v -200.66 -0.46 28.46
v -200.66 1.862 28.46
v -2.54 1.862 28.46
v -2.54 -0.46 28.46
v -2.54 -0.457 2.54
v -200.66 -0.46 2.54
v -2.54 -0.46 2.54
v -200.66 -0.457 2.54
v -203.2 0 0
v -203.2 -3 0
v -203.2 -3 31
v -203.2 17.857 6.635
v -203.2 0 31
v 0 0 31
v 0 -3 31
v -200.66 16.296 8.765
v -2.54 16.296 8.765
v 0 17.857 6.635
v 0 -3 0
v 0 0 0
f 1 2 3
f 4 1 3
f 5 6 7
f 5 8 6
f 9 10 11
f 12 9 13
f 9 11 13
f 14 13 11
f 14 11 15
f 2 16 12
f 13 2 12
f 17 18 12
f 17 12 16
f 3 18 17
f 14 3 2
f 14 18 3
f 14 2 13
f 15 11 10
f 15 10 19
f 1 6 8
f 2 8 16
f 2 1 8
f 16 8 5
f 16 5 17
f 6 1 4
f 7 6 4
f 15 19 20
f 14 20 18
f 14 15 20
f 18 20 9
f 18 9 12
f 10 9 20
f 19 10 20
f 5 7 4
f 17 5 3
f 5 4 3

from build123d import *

# Parameters (mm, degrees)
F0_W     = 203.2
F0_H     = 31
F1_DEPTH = 3
F3_DEPTH = 203.2
F4_T     = -2.54


with BuildPart() as f1:
    # F0 (on Front) → F1 (new body)
    with BuildSketch(Plane.XZ):
        with Locations((-101.6, 15.5)):
            Rectangle(F0_W, F0_H)
    extrude(amount=F1_DEPTH)

    # F2 (on face) → F3 (join)
    with BuildSketch(Plane.YZ):
        Polygon((0, 31), (0, 0), (17.857041, 6.635404), align=None)
    extrude(amount=-F3_DEPTH)

    # F4
    f4_openings = [f1.faces().sort_by_distance(p)[0] for p in [
        (-101.6, 8.928521, 18.817702),
    ]]
    offset(amount=F4_T, openings=f4_openings)


solid = f1.part
